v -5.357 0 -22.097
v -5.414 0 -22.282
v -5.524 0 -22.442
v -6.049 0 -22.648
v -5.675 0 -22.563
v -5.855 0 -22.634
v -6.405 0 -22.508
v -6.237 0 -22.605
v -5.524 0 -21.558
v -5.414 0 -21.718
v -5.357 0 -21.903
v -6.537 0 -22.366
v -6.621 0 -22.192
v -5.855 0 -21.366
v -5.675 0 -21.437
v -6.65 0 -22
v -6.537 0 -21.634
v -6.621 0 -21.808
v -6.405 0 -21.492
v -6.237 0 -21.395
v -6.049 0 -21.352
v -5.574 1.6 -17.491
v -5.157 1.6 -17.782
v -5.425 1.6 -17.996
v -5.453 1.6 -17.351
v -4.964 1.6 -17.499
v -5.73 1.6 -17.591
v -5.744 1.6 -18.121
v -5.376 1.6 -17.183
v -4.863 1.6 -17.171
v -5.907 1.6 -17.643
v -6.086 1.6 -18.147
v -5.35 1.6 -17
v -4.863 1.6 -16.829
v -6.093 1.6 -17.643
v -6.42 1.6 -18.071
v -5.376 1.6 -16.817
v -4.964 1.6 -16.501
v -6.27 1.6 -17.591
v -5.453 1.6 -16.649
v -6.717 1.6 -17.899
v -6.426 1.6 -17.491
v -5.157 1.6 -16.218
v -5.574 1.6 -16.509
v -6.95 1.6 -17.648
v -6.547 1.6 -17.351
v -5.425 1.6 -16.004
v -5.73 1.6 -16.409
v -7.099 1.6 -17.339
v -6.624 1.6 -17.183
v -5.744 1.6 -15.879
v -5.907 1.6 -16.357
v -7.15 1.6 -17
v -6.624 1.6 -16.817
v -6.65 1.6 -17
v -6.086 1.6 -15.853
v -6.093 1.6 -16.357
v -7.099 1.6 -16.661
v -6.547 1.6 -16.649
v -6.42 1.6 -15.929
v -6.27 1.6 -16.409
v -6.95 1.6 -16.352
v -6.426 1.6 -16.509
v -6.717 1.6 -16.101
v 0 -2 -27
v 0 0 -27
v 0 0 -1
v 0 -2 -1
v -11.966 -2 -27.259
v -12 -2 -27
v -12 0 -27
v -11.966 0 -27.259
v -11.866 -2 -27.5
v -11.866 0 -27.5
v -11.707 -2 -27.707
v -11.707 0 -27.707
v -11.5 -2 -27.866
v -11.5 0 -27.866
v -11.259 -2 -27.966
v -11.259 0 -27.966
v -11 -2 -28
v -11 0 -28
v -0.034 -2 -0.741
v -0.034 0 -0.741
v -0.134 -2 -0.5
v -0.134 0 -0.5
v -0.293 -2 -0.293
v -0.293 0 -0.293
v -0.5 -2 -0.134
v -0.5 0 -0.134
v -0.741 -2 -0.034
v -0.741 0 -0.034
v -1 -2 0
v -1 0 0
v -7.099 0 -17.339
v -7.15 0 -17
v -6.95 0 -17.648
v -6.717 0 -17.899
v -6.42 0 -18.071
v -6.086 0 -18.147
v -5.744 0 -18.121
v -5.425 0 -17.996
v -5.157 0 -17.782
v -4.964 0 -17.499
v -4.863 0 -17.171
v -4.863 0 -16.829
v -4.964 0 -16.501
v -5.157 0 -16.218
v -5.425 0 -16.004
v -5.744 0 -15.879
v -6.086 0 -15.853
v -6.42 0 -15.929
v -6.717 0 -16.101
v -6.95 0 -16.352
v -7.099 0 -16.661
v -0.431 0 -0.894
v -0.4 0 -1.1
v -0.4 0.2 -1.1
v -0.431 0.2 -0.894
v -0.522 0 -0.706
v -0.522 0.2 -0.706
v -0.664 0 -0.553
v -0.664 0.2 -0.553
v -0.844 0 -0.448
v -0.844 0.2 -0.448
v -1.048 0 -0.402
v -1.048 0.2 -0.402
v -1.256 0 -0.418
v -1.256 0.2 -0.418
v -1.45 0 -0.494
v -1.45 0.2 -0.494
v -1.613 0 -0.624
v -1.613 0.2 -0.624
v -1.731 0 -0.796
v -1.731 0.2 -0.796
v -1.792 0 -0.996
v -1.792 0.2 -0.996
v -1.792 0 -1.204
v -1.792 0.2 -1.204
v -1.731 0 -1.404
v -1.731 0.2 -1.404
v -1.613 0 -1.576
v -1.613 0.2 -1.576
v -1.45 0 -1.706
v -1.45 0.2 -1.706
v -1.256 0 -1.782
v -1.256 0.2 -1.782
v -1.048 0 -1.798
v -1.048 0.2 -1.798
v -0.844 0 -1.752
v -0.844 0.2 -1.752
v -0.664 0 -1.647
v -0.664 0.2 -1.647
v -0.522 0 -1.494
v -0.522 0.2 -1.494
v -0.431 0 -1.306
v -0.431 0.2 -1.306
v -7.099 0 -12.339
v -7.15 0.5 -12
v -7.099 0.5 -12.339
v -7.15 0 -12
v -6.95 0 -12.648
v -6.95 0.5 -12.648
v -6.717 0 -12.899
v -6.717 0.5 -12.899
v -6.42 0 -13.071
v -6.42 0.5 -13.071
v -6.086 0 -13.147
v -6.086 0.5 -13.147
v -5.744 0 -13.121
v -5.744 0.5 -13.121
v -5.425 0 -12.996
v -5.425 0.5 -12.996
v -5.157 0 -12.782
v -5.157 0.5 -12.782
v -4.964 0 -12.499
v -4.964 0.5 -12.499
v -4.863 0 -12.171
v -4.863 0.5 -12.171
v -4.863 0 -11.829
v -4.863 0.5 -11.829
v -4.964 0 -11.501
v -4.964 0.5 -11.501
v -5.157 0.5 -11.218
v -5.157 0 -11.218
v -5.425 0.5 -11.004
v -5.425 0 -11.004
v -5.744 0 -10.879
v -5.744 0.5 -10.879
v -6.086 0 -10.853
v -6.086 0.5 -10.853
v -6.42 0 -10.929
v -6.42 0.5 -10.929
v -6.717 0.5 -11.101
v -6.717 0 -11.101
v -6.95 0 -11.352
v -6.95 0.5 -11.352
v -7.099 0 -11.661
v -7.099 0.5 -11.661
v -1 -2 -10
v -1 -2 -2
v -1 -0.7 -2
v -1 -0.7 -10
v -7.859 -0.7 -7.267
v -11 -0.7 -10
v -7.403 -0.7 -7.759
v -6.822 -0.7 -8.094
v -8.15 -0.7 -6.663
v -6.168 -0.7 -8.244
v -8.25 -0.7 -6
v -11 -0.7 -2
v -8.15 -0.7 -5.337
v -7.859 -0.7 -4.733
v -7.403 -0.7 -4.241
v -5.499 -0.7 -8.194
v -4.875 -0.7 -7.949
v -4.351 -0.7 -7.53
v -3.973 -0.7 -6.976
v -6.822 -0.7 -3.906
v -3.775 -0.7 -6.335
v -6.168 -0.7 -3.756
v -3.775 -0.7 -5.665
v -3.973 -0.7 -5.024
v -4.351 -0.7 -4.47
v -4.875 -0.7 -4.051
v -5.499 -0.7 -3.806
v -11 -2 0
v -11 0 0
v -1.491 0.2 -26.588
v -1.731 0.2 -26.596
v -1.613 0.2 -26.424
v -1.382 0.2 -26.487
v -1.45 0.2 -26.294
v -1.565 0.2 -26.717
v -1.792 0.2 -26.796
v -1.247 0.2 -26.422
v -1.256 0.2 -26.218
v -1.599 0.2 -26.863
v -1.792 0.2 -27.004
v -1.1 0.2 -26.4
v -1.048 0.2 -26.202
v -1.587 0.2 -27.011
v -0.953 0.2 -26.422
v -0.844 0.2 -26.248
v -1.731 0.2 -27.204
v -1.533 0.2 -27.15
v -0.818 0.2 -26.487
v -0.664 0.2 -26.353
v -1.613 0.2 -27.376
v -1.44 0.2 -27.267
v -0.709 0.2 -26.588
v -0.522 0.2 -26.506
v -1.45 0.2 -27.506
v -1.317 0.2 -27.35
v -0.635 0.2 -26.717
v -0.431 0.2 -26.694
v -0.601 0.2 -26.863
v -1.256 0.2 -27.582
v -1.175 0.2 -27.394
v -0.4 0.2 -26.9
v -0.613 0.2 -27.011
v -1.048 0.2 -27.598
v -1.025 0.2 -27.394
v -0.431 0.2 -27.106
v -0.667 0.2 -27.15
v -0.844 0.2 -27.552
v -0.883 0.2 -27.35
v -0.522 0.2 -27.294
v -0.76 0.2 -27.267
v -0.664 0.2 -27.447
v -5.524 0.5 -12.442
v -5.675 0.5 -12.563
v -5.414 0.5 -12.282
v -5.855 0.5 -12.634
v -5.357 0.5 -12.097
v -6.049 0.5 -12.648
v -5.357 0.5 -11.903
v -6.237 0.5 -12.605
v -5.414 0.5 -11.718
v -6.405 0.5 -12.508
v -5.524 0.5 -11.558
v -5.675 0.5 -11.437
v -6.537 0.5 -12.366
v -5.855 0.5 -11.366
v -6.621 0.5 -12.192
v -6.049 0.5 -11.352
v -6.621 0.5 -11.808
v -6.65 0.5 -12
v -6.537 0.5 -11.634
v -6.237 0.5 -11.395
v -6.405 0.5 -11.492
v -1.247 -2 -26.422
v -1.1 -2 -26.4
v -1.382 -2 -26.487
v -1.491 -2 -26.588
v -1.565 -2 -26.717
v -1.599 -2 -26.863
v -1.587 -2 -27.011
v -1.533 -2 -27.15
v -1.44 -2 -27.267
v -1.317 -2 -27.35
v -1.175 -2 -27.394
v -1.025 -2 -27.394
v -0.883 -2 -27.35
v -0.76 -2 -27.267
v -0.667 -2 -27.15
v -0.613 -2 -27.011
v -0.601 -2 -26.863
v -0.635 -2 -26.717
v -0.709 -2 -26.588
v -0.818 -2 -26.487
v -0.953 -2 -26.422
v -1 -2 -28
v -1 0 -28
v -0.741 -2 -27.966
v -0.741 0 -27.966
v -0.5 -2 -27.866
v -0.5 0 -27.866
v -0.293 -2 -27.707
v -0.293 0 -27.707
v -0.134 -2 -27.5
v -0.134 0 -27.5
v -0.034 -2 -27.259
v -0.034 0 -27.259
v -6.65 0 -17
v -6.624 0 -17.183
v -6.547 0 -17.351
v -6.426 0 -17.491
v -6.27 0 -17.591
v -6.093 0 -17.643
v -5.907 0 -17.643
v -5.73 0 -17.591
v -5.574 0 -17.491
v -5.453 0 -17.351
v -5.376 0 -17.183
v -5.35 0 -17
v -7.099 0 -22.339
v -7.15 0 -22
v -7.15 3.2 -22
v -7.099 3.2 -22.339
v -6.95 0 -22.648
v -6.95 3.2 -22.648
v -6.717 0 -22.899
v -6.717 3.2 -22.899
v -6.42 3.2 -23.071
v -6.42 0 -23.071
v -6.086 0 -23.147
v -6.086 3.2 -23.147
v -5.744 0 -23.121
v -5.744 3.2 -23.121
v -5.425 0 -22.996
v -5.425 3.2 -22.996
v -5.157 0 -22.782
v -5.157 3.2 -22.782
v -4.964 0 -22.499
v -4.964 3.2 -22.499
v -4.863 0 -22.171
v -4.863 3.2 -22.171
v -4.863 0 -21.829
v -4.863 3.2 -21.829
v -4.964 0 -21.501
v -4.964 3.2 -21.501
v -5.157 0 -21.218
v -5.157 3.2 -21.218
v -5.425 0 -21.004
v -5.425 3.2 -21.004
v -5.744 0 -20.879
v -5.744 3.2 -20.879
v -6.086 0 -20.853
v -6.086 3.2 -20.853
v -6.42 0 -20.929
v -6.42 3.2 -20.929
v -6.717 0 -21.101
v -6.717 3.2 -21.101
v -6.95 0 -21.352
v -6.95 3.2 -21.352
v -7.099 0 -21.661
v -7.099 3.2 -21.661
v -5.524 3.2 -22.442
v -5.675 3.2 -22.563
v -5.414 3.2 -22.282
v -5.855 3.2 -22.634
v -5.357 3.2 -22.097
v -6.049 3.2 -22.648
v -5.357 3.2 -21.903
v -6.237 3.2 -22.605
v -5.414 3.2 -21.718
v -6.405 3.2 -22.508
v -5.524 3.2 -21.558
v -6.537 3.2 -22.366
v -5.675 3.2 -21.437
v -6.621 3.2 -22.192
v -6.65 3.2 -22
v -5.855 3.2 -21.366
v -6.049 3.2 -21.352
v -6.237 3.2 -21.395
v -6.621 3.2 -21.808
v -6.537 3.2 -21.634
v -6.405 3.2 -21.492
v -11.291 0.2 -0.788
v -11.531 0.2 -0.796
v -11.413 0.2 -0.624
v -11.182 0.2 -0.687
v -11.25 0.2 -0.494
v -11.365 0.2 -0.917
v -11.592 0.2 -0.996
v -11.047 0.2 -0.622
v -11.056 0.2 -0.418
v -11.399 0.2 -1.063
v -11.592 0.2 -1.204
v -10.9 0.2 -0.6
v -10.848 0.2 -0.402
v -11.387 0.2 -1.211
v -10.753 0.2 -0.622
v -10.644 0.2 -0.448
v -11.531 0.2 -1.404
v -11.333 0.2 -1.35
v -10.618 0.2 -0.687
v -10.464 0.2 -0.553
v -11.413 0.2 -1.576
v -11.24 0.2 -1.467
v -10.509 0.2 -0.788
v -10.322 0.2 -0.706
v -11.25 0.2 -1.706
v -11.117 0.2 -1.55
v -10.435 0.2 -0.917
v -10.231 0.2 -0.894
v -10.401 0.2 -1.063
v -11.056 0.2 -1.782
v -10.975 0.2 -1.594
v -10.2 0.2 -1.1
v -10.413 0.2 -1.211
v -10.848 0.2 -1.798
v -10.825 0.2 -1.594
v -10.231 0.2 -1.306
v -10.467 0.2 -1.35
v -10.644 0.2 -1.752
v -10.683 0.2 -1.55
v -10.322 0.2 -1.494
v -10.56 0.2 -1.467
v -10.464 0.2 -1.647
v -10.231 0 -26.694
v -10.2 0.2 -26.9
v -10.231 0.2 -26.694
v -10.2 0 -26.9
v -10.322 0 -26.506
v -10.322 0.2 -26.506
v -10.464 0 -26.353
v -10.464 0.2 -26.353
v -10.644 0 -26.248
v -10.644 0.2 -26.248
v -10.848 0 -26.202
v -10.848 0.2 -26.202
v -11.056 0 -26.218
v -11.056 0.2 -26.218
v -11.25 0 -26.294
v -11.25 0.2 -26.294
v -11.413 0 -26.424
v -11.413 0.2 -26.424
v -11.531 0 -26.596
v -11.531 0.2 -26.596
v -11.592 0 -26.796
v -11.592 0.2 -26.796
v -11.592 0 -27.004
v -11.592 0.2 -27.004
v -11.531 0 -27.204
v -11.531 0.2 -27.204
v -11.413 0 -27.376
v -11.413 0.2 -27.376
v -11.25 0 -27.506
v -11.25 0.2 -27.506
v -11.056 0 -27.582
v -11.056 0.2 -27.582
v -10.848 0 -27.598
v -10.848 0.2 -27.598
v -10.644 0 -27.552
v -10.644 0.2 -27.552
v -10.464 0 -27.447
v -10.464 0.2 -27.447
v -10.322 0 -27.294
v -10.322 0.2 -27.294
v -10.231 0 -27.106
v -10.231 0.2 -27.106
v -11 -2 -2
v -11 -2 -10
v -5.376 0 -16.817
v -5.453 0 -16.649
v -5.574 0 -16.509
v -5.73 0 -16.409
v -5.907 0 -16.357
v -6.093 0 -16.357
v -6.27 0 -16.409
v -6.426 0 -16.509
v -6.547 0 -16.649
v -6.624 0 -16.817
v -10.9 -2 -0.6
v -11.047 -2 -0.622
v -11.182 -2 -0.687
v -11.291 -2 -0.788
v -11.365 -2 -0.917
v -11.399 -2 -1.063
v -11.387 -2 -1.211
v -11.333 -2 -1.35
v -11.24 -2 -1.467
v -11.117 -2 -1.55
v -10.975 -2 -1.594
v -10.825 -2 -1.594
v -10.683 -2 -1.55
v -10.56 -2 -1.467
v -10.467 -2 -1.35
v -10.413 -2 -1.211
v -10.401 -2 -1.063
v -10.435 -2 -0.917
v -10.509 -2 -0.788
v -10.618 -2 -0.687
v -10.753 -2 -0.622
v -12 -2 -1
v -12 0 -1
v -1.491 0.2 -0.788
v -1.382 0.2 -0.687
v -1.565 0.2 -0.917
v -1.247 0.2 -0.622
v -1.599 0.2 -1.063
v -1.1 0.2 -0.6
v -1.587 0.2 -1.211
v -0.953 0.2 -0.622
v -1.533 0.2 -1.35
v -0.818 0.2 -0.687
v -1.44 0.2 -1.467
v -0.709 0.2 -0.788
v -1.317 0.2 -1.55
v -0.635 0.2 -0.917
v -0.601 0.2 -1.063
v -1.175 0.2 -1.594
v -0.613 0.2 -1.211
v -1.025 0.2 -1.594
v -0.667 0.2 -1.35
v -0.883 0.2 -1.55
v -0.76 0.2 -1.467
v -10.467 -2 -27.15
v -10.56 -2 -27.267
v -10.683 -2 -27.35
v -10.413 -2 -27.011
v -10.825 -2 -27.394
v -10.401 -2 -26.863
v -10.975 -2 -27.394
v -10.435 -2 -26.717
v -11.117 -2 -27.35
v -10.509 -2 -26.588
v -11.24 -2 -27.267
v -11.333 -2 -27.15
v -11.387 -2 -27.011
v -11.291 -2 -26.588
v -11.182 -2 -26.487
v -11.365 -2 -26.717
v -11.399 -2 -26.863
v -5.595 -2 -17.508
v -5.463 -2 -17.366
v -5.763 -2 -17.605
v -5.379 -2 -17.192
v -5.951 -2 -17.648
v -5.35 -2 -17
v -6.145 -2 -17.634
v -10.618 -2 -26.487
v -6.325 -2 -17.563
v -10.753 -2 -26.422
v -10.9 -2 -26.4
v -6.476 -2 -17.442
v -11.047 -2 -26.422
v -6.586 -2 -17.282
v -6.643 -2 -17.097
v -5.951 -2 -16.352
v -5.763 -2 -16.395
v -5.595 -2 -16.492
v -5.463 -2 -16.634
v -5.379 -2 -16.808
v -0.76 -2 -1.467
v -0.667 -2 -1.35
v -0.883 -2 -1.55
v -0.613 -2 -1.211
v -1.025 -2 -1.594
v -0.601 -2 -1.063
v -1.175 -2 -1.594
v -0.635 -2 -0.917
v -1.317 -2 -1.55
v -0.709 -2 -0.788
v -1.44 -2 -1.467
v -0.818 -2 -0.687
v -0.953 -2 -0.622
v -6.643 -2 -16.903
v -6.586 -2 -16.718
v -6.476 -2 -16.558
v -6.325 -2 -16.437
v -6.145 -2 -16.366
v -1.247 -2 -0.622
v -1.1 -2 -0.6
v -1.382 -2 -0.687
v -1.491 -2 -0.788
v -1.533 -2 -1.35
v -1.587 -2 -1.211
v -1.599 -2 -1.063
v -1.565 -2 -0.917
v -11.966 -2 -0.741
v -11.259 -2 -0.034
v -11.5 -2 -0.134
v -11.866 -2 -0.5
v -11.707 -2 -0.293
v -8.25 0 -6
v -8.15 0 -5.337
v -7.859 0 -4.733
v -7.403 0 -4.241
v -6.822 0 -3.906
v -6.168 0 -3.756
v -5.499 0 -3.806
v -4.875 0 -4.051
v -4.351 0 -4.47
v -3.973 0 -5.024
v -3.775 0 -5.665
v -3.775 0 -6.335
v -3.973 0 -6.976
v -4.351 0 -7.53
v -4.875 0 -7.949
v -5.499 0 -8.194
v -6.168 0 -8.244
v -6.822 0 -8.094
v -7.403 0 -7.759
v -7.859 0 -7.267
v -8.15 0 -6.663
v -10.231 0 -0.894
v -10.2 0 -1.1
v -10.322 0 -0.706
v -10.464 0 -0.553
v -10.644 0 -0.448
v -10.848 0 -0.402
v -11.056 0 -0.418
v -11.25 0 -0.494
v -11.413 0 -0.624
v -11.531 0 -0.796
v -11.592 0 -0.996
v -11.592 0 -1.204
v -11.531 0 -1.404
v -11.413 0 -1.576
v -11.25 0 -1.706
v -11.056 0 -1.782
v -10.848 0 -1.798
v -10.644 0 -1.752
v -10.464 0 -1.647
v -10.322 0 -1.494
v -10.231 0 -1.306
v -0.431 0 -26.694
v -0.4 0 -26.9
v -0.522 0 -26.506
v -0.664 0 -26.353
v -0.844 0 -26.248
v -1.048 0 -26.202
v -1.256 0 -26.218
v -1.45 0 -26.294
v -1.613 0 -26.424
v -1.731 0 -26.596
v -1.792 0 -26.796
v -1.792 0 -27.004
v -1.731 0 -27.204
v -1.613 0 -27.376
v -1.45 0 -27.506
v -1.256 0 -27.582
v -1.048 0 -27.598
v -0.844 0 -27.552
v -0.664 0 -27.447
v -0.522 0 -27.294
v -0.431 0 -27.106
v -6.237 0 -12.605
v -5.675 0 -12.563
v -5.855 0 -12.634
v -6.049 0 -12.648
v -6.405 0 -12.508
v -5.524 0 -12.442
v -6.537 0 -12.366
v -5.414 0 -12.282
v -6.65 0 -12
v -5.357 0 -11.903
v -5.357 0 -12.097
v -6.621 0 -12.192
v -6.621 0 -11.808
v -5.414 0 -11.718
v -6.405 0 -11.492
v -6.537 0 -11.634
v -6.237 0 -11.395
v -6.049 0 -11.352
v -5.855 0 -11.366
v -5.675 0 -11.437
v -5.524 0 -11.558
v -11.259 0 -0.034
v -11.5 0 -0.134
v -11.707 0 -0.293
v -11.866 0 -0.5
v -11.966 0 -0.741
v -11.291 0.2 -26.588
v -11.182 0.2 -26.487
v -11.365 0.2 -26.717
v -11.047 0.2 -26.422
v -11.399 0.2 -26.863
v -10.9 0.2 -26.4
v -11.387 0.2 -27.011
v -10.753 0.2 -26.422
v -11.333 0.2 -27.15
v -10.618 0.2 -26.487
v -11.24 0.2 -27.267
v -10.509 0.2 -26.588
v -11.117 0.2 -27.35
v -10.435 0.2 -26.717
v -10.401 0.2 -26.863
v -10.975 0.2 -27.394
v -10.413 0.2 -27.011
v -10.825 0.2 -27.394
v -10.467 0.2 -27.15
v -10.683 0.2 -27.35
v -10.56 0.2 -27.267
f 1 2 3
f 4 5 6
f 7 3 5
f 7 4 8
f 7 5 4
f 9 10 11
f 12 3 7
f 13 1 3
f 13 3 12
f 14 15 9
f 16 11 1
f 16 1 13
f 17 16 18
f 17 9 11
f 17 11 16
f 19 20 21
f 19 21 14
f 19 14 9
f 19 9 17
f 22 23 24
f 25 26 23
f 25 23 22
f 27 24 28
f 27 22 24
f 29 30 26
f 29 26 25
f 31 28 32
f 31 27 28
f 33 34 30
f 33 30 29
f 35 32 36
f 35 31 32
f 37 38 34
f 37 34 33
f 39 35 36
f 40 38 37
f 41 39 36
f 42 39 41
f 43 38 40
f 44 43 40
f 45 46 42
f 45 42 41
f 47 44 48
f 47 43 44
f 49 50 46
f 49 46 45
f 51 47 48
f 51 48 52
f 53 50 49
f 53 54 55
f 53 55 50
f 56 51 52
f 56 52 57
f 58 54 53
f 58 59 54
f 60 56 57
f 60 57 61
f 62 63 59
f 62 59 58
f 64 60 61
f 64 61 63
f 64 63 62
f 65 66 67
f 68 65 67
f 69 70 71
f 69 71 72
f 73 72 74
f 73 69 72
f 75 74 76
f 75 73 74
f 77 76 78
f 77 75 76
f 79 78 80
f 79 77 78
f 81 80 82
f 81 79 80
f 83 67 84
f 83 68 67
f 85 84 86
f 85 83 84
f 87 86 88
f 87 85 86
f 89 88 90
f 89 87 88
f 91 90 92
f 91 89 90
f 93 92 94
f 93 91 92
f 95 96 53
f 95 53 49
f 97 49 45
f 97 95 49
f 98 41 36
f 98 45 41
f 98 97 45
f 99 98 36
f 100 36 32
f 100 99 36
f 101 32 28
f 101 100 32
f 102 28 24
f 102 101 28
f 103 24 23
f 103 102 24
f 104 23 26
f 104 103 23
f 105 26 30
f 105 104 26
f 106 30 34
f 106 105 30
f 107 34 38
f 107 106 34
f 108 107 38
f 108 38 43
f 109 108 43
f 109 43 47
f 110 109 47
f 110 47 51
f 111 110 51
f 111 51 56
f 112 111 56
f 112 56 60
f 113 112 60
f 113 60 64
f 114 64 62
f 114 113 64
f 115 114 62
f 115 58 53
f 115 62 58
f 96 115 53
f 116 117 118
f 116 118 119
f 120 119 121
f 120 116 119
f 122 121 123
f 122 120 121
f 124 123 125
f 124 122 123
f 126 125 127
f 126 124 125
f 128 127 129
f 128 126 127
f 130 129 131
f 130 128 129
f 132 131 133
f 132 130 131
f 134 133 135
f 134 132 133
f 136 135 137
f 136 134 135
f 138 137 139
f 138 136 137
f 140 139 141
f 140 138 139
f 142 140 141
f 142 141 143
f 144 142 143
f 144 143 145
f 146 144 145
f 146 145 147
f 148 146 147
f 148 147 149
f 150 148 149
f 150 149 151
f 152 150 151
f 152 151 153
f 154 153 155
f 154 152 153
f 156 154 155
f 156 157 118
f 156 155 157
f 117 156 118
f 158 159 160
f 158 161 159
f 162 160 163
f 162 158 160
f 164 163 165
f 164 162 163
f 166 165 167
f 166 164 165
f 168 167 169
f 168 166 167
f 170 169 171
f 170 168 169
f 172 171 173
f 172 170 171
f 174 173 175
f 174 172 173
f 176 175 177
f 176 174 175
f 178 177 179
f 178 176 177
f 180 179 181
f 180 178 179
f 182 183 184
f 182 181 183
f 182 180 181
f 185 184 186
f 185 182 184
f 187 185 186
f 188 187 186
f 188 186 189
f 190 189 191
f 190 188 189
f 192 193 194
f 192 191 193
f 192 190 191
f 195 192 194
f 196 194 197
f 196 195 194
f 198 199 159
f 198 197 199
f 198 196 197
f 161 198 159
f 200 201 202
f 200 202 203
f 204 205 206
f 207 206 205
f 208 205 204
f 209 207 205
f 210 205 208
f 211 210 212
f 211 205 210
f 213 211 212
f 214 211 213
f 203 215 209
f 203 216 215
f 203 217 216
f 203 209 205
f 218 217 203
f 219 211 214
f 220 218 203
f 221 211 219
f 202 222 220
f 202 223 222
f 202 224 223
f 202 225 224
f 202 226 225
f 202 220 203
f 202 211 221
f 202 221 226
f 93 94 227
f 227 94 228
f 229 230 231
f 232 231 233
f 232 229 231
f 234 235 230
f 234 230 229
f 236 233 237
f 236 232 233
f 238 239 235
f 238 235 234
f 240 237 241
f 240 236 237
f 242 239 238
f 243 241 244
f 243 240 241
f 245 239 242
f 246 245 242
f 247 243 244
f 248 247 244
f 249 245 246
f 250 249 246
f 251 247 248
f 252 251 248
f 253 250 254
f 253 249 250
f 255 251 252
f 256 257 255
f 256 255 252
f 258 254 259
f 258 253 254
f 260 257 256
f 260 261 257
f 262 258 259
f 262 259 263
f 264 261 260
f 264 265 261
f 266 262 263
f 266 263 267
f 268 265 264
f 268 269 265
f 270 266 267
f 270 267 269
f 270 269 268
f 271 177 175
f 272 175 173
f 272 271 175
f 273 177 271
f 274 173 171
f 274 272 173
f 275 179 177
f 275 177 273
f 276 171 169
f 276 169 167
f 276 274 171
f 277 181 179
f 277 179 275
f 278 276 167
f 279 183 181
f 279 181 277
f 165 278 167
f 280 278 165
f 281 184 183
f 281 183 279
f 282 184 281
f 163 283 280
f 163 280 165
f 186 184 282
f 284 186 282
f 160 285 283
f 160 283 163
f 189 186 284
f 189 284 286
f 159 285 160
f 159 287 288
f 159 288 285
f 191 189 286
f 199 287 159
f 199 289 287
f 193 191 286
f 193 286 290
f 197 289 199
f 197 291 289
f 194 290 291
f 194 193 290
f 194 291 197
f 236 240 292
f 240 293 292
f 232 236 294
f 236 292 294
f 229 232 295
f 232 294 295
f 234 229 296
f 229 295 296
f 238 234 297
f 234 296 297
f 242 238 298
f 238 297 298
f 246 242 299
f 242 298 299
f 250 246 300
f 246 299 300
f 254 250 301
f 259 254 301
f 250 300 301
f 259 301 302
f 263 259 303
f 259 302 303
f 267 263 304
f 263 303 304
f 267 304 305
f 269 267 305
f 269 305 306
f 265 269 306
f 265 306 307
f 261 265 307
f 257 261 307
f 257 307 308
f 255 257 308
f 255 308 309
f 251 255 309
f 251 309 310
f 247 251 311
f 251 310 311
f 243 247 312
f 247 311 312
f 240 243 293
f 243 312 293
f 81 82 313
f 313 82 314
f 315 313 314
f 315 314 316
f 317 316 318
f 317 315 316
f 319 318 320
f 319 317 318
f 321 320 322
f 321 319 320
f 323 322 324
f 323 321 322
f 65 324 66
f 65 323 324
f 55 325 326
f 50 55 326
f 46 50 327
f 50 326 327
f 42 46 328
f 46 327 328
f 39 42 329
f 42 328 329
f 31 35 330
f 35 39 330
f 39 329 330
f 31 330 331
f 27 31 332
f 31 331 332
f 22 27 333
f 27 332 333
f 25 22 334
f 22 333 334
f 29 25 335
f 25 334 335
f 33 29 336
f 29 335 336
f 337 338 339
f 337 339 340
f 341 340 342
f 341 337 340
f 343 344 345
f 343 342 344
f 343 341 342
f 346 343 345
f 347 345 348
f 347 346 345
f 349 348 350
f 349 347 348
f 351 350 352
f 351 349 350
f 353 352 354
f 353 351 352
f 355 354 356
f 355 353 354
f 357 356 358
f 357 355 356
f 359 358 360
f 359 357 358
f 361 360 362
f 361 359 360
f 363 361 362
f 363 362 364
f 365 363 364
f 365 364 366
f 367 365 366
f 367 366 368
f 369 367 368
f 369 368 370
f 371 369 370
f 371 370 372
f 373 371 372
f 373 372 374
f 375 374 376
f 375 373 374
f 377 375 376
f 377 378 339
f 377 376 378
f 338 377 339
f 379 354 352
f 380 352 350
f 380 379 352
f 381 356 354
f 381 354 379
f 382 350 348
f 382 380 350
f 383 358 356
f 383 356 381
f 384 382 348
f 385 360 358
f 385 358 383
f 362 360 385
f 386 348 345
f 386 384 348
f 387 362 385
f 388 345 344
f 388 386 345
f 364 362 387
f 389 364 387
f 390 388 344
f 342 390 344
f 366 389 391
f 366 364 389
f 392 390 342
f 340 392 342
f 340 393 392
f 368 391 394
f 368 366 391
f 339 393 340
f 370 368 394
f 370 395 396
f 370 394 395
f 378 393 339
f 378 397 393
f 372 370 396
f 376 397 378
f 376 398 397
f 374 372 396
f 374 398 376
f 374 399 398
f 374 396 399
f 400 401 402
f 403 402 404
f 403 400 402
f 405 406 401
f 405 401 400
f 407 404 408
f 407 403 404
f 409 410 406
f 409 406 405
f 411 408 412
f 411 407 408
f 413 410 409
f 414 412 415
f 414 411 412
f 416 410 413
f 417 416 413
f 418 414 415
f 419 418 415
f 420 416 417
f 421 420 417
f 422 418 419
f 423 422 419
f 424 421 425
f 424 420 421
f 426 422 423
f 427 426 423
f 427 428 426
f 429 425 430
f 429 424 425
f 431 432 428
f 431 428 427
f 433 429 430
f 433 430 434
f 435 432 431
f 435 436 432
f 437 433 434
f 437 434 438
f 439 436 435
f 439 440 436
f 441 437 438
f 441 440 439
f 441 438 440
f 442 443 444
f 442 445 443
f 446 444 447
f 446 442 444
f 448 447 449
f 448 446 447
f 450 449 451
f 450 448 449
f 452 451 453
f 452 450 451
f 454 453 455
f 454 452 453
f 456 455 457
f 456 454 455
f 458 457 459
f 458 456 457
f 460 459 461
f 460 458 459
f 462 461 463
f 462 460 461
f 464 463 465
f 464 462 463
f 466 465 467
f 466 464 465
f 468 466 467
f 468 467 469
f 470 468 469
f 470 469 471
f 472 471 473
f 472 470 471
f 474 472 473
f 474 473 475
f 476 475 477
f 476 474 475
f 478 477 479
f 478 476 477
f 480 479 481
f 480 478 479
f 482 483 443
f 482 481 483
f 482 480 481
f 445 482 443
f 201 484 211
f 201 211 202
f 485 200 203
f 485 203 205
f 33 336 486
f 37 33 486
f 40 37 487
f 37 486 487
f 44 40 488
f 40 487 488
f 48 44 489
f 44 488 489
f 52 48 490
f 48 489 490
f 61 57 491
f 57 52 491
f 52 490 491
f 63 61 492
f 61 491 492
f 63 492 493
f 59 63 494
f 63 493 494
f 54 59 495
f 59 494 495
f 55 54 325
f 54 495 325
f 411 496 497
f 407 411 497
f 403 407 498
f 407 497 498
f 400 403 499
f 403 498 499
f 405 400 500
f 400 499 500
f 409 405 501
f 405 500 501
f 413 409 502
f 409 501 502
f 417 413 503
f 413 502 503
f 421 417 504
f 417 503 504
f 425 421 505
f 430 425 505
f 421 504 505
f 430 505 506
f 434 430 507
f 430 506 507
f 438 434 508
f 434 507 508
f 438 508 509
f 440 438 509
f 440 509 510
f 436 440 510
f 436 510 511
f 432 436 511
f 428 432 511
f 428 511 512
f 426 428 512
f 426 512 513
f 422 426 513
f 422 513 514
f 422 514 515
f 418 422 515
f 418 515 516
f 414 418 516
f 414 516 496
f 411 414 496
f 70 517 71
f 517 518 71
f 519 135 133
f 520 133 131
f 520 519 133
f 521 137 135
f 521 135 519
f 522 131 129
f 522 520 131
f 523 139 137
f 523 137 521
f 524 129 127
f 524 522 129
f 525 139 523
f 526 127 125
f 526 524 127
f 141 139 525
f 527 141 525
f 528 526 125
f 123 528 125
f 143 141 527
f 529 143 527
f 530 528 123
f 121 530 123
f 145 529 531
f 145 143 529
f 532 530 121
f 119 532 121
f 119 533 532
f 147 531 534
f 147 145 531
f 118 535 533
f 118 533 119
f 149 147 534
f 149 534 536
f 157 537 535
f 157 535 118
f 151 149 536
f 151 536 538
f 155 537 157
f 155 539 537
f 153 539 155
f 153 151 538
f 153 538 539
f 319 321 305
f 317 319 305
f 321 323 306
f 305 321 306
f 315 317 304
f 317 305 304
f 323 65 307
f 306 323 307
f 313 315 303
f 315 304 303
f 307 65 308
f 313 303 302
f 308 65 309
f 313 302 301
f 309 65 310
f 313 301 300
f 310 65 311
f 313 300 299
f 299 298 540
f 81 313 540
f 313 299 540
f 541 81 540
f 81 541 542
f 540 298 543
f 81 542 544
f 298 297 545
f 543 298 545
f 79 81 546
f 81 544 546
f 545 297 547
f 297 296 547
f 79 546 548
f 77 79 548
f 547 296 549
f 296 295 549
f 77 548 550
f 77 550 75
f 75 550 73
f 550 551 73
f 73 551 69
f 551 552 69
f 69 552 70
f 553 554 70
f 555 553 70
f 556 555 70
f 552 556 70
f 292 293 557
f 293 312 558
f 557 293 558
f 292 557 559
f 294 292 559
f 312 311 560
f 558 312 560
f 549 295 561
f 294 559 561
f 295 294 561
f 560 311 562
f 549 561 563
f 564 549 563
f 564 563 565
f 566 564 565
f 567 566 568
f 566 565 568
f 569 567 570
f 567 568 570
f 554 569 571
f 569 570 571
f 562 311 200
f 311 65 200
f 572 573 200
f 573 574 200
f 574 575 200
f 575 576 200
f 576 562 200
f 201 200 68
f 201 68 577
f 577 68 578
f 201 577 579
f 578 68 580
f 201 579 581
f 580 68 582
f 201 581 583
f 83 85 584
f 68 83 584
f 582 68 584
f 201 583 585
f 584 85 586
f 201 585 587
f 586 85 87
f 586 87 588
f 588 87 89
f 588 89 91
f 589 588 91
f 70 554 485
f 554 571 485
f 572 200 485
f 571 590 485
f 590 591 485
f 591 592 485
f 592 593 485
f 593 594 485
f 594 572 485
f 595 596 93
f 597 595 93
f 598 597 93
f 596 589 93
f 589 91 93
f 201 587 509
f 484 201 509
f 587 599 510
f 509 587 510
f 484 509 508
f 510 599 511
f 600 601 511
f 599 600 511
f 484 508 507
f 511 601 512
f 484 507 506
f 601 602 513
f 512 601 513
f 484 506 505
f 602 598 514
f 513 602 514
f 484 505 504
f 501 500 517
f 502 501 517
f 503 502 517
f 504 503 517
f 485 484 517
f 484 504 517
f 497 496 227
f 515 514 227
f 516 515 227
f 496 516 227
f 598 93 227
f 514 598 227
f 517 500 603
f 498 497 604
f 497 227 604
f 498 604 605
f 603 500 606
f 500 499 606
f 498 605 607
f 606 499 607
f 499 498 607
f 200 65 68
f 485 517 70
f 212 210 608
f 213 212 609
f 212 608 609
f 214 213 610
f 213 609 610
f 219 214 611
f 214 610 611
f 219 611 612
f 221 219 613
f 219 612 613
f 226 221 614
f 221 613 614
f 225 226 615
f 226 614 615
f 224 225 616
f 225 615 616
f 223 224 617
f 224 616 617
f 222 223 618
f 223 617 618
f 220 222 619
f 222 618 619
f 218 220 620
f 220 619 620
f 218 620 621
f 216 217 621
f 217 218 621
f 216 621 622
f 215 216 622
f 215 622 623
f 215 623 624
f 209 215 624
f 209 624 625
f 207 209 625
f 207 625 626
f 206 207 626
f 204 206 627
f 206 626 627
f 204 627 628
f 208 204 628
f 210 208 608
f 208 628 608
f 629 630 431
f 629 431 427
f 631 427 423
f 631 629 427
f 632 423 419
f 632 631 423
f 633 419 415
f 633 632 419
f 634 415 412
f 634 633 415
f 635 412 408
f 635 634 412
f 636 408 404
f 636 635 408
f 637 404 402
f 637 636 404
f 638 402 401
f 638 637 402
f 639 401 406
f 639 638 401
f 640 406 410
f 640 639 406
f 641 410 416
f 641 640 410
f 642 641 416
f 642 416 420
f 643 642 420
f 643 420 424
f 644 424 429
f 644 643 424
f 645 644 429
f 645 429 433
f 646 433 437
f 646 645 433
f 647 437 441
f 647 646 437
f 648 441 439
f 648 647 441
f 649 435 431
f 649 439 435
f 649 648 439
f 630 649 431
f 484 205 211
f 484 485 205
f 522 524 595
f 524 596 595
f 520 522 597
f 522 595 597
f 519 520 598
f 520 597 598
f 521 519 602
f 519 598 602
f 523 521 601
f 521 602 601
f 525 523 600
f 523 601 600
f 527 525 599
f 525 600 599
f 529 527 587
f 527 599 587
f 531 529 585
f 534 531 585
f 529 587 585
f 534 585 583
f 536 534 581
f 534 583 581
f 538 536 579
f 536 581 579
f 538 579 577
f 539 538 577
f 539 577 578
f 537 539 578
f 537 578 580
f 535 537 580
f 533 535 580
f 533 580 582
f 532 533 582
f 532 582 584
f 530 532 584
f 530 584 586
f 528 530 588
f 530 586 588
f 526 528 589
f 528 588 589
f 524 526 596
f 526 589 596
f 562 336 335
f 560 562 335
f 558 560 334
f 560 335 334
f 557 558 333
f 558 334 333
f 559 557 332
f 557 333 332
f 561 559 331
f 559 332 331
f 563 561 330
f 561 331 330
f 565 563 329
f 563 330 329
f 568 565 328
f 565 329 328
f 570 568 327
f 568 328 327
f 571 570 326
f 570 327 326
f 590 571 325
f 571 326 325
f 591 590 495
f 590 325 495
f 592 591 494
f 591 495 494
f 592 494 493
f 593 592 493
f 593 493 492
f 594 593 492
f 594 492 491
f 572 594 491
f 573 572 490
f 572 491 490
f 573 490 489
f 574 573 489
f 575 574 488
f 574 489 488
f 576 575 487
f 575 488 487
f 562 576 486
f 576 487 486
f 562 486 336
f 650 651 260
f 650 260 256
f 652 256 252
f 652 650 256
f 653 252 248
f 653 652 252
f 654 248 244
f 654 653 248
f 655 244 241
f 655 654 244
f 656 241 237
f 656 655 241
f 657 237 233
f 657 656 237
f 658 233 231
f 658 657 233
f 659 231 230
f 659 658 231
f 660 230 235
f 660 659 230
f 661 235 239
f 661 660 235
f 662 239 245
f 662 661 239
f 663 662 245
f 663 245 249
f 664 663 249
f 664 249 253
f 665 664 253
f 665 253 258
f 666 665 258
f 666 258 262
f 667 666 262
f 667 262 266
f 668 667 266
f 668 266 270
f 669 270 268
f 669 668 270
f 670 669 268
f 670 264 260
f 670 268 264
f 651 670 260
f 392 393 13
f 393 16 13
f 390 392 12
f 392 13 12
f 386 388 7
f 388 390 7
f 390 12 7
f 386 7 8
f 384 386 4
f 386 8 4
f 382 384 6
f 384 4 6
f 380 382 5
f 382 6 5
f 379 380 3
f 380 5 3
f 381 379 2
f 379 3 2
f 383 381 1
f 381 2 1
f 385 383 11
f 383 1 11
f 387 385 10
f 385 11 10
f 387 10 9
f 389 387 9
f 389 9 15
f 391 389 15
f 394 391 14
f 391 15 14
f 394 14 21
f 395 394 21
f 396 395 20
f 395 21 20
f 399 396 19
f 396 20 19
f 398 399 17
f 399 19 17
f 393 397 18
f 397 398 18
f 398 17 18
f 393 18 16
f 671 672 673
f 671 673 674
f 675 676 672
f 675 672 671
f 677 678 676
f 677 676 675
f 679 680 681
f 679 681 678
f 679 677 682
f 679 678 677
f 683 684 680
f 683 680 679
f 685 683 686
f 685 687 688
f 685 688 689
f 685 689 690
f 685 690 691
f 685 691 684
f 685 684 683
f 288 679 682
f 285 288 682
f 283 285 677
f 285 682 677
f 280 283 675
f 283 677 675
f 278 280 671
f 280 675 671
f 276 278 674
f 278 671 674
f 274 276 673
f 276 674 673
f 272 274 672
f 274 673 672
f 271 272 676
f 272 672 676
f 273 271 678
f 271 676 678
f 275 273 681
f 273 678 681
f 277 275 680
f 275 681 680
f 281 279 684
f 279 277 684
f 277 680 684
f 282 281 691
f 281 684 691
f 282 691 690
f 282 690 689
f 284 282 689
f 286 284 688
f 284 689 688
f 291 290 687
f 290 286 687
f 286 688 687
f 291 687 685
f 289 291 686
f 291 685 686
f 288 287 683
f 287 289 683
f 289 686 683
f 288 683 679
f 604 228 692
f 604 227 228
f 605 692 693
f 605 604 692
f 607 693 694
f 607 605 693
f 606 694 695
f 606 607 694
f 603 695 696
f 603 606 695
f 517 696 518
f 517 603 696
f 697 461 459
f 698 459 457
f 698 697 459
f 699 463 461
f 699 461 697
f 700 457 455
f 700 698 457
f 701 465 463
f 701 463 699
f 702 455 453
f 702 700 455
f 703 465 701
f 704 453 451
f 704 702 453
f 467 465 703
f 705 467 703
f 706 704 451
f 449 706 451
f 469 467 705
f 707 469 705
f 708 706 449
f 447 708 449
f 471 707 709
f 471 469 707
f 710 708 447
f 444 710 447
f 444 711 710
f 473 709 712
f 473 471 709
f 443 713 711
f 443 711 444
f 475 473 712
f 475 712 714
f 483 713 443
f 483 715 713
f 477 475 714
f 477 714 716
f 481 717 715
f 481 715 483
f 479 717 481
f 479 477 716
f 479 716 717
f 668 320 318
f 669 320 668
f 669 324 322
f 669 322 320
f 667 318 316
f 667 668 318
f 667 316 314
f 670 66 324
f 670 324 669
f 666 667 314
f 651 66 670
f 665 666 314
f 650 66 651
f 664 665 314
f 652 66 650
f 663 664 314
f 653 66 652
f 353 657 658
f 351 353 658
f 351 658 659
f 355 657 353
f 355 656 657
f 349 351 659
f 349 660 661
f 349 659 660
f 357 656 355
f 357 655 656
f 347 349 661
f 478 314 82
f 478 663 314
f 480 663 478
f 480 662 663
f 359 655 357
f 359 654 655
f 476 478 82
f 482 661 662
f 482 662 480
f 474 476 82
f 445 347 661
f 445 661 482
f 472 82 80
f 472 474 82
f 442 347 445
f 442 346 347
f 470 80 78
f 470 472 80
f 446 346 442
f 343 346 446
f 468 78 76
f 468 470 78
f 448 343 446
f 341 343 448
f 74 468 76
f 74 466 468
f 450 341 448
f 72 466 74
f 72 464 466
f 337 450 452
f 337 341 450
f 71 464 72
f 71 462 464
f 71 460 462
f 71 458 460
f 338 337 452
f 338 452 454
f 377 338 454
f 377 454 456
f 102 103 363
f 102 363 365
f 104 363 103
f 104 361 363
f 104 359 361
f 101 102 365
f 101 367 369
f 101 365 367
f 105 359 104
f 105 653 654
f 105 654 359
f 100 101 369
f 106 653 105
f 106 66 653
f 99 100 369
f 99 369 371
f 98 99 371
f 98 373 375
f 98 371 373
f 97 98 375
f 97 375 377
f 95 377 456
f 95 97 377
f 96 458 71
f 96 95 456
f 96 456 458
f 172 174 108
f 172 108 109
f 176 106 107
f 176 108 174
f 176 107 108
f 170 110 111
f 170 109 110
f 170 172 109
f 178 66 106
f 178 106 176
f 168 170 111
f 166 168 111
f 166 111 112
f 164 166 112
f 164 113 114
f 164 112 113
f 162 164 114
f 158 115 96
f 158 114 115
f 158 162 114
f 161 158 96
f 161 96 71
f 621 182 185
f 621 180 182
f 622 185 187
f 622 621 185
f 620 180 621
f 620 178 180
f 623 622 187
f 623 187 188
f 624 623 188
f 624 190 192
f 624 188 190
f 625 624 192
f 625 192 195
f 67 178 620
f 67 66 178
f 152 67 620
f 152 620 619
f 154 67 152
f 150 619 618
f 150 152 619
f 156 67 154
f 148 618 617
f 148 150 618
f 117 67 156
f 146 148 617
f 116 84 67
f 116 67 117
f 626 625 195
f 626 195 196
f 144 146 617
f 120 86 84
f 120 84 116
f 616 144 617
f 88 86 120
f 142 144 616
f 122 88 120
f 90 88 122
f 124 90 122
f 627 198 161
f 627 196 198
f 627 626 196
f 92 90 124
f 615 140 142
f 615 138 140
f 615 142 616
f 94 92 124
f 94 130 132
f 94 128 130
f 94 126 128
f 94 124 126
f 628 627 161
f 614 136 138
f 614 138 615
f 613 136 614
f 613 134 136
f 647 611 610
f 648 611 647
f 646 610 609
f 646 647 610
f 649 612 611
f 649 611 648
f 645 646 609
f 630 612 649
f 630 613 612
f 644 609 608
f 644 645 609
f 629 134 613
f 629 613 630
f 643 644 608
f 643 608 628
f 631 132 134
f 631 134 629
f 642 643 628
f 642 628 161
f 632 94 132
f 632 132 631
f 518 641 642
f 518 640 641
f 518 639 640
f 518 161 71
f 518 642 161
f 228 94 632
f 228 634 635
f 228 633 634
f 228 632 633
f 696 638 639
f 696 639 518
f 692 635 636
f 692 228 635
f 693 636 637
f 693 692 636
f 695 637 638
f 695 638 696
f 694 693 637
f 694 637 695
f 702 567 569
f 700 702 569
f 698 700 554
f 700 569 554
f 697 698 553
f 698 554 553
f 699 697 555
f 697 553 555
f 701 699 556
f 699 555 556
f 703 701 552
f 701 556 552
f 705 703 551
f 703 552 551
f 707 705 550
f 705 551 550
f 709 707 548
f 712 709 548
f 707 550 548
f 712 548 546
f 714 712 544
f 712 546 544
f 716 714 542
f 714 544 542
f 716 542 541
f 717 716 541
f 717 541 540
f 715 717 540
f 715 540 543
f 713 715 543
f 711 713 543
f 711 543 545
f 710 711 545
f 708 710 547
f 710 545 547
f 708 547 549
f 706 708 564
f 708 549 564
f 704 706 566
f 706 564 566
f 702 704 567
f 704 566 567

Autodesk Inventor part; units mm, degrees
ref_plane "YZ Plane" through (0, 0, 0) normal (1, 0, 0) x (0, 1, 0)
ref_plane "XZ Plane" through (0, 0, 0) normal (0, 1, 0) x (-1, 0, 0)
ref_plane "XY Plane" through (0, 0, 0) normal (0, 0, 1) x (1, 0, 0)
sketch "Эскиз1" plane through (0, 0, 0) normal (0, 1, 0) x (-1, 0, 0)
  line L0 (0, 0) -> (12, 0)
  line L1 (12, 0) -> (12, -28)
  line L2 (12, -28) -> (0, -28)
  line L3 (0, -28) -> (0, 0)
  circle A0 centre (6, -12) radius 0.65
  circle A1 centre (6, -17) radius 0.65
  circle A2 centre (6, -22) radius 0.65
  line L4 (6, -12) -> (6, -17) construction
  line L5 (6, -17) -> (6, -22) construction
  line L6 (6, -6) -> (6, 0) construction
  line L7 (6, -12) -> (12, -12) construction
  circle A3 centre (6, -17) radius 1.15
  circle A4 centre (6, -12) radius 1.15
  circle A5 centre (6, -22) radius 1.15
  circle A6 centre (6, -6) radius 2.25
  line L8 (6, -12) -> (6, -6) construction
  line L9 (6, -22) -> (6, -28) construction
  point P0 (12, -14)
  dimension "d1" = 5
  dimension "d4" = 6
  dimension "d5" = 1.3
  dimension "d6" = 0.5
  dimension "d30" = 6
  dimension "d31" = 4.5
extrude "Выдавливание1" add sketch "Эскиз1" against normal blind 2 contours L0 L1 L2 L3 | A0 | A1 | A2 | A3 | A4 | A5 | A6
extrude "Выдавливание2" add sketch "Эскиз1" along normal blind 0.5 contours A4
extrude "Выдавливание4" add sketch "Эскиз1" along normal blind 1.6 contours A3
extrude "Выдавливание5" add sketch "Эскиз1" along normal blind 3.2 contours A5
sketch "Эскиз2" plane through (-6, 1.6, -17) normal (0, 1, 0) x (1, 0, 0)
  circle A0 centre (0, 0) radius 0.65 projected
  point P0 (6, -17)
extrude "Выдавливание3" cut sketch "Эскиз2" against normal through all
extrude "Выдавливание7" cut sketch "Эскиз1" against normal through all contours A6
sketch "Эскиз7" plane through (0, -2, 0) normal (0, -1, 0) x (1, 0, 0)
  circle A0 centre (-6, -6) radius 2.25 projected
  line L0 (-1, -10) -> (-11, -10)
  line L1 (-11, -10) -> (-11, -2)
  line L2 (-11, -2) -> (-1, -2)
  line L3 (-1, -2) -> (-1, -10)
  line L4 (-1, -10) -> (-11, -2) construction
  line L5 (-11, -10) -> (-1, -2) construction
  point P0 (0, 0)
  dimension "d34" = 10
  dimension "d35" = 8
extrude "Выдавливание8" cut sketch "Эскиз7" against normal blind 1.3
sketch "Эскиз5" plane through (0, 0, 0) normal (0, 1, 0) x (1, 0, 0)
  circle A0 centre (-1.1, 1.1) radius 0.7
  line L0 (0, 0) -> (0, 28) projected
  line L1 (0, 0) -> (-12, 0) construction
  line L2 (-6, 0) -> (-6, 28) construction
  line L3 (-12, 28) -> (0, 28) construction
  line L4 (-12, 0) -> (-12, 28) construction
  line L5 (-12, 14) -> (0, 14) construction
  circle A1 centre (-10.9, 1.1) radius 0.7
  circle A2 centre (-1.1, 26.9) radius 0.7
  circle A3 centre (-10.9, 26.9) radius 0.7
  dimension "d17" = 1.1
  dimension "d18" = 1.4
  dimension "d19" = 1.1
extrude "Выдавливание6" add sketch "Эскиз5" along normal blind 0.2
sketch "Эскиз6" plane through (-10.9, 0.2, -1.1) normal (0, 1, 0) x (1, 0, 0)
  circle A0 centre (0, 0) radius 0.7 projected
  circle A1 centre (9.8, 0) radius 0.7 projected
  circle A2 centre (9.8, 25.8) radius 0.7 projected
  circle A3 centre (0, 25.8) radius 0.7 projected
  point P0 (10.9, -1.1)
hole "Отверстие1" at (-10.9, 0.2, -1.1) at (-1.1, 0.2, -1.1) at (-10.9, 0.2, -26.9) at (-1.1, 0.2, -26.9) direction (0, -1, 0) diameter 1 end through all
fillet "Сопряжение1" radius 1 4 edges at (0, -1, 0) (-12, -1, 0) (0, -1, -28) (-12, -1, -28)
equation "\"d19\" = d17"
properties part number "Основание сервы"
